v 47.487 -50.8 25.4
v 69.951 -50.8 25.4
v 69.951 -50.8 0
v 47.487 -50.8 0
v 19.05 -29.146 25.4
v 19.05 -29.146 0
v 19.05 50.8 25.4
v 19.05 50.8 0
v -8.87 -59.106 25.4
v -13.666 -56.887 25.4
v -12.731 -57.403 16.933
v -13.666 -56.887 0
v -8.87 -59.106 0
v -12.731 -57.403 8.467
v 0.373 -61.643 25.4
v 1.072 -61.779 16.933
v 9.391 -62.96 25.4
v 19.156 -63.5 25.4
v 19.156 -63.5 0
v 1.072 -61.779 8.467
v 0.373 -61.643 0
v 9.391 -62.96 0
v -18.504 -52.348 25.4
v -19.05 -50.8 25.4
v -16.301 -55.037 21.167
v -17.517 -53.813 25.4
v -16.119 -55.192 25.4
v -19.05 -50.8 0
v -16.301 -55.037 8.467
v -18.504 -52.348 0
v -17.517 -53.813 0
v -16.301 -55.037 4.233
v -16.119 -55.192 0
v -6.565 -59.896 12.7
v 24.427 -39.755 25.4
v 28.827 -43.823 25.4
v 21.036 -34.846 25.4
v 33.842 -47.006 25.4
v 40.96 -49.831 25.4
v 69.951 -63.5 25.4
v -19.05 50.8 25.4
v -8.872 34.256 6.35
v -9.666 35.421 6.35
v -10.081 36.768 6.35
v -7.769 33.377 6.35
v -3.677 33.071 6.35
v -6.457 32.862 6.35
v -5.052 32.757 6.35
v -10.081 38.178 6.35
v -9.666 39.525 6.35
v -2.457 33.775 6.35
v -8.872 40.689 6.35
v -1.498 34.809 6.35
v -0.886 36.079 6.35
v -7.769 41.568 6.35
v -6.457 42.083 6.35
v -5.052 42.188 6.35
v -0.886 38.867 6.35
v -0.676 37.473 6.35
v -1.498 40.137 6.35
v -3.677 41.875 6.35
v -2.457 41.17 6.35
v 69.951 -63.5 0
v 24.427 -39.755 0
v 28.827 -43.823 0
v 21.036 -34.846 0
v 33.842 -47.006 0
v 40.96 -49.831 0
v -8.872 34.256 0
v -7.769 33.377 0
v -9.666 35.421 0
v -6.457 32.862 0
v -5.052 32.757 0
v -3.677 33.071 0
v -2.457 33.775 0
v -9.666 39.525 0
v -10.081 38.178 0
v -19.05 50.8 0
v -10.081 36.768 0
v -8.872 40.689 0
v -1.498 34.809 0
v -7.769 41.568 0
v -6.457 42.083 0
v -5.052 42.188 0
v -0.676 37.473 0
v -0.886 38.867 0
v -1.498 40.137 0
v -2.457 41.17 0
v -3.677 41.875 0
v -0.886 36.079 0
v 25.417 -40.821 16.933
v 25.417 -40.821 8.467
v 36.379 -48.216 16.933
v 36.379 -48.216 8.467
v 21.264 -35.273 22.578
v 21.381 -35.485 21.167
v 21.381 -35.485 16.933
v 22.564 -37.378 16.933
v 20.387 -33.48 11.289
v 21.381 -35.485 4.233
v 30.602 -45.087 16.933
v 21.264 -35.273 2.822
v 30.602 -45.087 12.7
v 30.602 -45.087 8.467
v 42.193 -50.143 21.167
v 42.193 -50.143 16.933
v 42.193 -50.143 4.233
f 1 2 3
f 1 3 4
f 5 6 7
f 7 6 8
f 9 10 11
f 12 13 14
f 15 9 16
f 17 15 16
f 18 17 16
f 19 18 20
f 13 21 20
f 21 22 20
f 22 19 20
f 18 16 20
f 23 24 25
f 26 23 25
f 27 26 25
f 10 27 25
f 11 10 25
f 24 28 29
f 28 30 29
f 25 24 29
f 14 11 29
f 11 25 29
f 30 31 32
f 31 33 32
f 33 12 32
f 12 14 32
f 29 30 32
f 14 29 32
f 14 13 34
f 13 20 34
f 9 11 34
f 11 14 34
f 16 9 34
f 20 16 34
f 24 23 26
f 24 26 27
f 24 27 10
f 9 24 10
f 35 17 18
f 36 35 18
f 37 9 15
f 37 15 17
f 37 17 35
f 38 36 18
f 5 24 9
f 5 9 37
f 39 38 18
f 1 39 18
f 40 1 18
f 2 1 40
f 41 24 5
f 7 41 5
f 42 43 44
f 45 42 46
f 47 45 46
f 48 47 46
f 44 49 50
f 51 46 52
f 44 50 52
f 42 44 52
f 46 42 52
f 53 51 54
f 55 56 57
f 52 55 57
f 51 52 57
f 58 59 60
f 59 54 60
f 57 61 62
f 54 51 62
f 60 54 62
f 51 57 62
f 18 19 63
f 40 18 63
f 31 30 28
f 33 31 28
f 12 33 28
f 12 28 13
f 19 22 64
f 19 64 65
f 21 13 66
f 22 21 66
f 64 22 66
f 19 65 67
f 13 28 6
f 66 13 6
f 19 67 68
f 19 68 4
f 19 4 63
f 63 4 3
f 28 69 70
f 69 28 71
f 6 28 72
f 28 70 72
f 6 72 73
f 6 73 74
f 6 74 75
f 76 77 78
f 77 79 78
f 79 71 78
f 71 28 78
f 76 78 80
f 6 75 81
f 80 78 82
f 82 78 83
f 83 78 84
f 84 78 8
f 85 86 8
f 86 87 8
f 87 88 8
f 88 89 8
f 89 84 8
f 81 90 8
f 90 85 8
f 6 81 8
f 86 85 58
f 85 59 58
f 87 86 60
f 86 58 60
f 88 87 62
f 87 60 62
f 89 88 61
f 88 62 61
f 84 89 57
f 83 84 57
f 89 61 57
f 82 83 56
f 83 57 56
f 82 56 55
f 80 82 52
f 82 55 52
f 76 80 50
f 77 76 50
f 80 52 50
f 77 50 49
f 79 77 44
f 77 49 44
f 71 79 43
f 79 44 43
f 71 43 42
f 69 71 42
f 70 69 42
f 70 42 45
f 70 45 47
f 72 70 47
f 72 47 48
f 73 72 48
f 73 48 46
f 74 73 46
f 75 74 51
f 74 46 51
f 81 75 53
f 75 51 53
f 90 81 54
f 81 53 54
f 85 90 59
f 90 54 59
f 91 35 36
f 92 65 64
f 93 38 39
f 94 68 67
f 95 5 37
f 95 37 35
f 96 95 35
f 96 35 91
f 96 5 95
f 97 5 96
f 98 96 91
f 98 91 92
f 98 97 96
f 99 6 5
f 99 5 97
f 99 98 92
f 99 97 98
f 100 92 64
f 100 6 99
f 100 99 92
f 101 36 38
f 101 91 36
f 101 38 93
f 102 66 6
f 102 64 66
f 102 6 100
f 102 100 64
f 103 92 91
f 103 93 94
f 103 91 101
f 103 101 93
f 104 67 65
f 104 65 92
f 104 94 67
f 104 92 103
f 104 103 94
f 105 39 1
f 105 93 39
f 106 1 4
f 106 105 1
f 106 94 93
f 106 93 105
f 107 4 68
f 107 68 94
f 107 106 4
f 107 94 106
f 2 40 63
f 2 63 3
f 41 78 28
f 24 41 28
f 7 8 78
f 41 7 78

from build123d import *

# Parameters (mm, degrees)
F1_DEPTH = 25.4
F2_R     = 4.72896
F3_DEPTH = 6.35


with BuildPart() as f1:
    # F0 (on Top) → F1 (new body)
    with BuildSketch(Plane.XY):
        Polygon((19.05, 50.8), (-19.05, 50.8), (-19.05, -50.8), (19.05, -50.8), (19.05, -29.146114), align=None)
        with BuildLine():
            Line((19.05, -50.8), (-19.05, -50.8))
            add(Edge.make_bspline(
                [(-19.05, -50.8), (-17.541779, -58.375139), (0, -63.247859), (19.156481, -63.5)],
                knots=[0, 0, 0, 0, 40.261957, 40.261957, 40.261957, 40.261957], degree=3))
            Line((19.156481, -63.5), (19.156481, -50.8))
            Line((19.156481, -50.8), (19.05, -50.8))
        make_face()
        with BuildLine():
            add(Edge.make_bspline(
                [(19.05, -29.146114), (21.634858, -42.782448), (37.790419, -50.8), (47.486834, -50.8)],
                knots=[0, 0, 0, 0, 35.742752, 35.742752, 35.742752, 35.742752], degree=3))
            Line((19.05, -29.146114), (19.05, -50.8))
            Line((19.05, -50.8), (19.156481, -50.8))
            Line((19.156481, -50.8), (47.486834, -50.8))
        make_face()
        Polygon((19.156481, -50.8), (19.156481, -63.5), (69.950667, -63.5), (69.950667, -50.8), (47.486834, -50.8), align=None)
    extrude(amount=F1_DEPTH)

    # F2 (on Top) → F3 (cut, symmetric)
    with BuildSketch(Plane.XY):
        with Locations((-5.404981, 37.472747)):
            Circle(F2_R)
    extrude(amount=F3_DEPTH, both=True, mode=Mode.SUBTRACT)


solid = f1.part
